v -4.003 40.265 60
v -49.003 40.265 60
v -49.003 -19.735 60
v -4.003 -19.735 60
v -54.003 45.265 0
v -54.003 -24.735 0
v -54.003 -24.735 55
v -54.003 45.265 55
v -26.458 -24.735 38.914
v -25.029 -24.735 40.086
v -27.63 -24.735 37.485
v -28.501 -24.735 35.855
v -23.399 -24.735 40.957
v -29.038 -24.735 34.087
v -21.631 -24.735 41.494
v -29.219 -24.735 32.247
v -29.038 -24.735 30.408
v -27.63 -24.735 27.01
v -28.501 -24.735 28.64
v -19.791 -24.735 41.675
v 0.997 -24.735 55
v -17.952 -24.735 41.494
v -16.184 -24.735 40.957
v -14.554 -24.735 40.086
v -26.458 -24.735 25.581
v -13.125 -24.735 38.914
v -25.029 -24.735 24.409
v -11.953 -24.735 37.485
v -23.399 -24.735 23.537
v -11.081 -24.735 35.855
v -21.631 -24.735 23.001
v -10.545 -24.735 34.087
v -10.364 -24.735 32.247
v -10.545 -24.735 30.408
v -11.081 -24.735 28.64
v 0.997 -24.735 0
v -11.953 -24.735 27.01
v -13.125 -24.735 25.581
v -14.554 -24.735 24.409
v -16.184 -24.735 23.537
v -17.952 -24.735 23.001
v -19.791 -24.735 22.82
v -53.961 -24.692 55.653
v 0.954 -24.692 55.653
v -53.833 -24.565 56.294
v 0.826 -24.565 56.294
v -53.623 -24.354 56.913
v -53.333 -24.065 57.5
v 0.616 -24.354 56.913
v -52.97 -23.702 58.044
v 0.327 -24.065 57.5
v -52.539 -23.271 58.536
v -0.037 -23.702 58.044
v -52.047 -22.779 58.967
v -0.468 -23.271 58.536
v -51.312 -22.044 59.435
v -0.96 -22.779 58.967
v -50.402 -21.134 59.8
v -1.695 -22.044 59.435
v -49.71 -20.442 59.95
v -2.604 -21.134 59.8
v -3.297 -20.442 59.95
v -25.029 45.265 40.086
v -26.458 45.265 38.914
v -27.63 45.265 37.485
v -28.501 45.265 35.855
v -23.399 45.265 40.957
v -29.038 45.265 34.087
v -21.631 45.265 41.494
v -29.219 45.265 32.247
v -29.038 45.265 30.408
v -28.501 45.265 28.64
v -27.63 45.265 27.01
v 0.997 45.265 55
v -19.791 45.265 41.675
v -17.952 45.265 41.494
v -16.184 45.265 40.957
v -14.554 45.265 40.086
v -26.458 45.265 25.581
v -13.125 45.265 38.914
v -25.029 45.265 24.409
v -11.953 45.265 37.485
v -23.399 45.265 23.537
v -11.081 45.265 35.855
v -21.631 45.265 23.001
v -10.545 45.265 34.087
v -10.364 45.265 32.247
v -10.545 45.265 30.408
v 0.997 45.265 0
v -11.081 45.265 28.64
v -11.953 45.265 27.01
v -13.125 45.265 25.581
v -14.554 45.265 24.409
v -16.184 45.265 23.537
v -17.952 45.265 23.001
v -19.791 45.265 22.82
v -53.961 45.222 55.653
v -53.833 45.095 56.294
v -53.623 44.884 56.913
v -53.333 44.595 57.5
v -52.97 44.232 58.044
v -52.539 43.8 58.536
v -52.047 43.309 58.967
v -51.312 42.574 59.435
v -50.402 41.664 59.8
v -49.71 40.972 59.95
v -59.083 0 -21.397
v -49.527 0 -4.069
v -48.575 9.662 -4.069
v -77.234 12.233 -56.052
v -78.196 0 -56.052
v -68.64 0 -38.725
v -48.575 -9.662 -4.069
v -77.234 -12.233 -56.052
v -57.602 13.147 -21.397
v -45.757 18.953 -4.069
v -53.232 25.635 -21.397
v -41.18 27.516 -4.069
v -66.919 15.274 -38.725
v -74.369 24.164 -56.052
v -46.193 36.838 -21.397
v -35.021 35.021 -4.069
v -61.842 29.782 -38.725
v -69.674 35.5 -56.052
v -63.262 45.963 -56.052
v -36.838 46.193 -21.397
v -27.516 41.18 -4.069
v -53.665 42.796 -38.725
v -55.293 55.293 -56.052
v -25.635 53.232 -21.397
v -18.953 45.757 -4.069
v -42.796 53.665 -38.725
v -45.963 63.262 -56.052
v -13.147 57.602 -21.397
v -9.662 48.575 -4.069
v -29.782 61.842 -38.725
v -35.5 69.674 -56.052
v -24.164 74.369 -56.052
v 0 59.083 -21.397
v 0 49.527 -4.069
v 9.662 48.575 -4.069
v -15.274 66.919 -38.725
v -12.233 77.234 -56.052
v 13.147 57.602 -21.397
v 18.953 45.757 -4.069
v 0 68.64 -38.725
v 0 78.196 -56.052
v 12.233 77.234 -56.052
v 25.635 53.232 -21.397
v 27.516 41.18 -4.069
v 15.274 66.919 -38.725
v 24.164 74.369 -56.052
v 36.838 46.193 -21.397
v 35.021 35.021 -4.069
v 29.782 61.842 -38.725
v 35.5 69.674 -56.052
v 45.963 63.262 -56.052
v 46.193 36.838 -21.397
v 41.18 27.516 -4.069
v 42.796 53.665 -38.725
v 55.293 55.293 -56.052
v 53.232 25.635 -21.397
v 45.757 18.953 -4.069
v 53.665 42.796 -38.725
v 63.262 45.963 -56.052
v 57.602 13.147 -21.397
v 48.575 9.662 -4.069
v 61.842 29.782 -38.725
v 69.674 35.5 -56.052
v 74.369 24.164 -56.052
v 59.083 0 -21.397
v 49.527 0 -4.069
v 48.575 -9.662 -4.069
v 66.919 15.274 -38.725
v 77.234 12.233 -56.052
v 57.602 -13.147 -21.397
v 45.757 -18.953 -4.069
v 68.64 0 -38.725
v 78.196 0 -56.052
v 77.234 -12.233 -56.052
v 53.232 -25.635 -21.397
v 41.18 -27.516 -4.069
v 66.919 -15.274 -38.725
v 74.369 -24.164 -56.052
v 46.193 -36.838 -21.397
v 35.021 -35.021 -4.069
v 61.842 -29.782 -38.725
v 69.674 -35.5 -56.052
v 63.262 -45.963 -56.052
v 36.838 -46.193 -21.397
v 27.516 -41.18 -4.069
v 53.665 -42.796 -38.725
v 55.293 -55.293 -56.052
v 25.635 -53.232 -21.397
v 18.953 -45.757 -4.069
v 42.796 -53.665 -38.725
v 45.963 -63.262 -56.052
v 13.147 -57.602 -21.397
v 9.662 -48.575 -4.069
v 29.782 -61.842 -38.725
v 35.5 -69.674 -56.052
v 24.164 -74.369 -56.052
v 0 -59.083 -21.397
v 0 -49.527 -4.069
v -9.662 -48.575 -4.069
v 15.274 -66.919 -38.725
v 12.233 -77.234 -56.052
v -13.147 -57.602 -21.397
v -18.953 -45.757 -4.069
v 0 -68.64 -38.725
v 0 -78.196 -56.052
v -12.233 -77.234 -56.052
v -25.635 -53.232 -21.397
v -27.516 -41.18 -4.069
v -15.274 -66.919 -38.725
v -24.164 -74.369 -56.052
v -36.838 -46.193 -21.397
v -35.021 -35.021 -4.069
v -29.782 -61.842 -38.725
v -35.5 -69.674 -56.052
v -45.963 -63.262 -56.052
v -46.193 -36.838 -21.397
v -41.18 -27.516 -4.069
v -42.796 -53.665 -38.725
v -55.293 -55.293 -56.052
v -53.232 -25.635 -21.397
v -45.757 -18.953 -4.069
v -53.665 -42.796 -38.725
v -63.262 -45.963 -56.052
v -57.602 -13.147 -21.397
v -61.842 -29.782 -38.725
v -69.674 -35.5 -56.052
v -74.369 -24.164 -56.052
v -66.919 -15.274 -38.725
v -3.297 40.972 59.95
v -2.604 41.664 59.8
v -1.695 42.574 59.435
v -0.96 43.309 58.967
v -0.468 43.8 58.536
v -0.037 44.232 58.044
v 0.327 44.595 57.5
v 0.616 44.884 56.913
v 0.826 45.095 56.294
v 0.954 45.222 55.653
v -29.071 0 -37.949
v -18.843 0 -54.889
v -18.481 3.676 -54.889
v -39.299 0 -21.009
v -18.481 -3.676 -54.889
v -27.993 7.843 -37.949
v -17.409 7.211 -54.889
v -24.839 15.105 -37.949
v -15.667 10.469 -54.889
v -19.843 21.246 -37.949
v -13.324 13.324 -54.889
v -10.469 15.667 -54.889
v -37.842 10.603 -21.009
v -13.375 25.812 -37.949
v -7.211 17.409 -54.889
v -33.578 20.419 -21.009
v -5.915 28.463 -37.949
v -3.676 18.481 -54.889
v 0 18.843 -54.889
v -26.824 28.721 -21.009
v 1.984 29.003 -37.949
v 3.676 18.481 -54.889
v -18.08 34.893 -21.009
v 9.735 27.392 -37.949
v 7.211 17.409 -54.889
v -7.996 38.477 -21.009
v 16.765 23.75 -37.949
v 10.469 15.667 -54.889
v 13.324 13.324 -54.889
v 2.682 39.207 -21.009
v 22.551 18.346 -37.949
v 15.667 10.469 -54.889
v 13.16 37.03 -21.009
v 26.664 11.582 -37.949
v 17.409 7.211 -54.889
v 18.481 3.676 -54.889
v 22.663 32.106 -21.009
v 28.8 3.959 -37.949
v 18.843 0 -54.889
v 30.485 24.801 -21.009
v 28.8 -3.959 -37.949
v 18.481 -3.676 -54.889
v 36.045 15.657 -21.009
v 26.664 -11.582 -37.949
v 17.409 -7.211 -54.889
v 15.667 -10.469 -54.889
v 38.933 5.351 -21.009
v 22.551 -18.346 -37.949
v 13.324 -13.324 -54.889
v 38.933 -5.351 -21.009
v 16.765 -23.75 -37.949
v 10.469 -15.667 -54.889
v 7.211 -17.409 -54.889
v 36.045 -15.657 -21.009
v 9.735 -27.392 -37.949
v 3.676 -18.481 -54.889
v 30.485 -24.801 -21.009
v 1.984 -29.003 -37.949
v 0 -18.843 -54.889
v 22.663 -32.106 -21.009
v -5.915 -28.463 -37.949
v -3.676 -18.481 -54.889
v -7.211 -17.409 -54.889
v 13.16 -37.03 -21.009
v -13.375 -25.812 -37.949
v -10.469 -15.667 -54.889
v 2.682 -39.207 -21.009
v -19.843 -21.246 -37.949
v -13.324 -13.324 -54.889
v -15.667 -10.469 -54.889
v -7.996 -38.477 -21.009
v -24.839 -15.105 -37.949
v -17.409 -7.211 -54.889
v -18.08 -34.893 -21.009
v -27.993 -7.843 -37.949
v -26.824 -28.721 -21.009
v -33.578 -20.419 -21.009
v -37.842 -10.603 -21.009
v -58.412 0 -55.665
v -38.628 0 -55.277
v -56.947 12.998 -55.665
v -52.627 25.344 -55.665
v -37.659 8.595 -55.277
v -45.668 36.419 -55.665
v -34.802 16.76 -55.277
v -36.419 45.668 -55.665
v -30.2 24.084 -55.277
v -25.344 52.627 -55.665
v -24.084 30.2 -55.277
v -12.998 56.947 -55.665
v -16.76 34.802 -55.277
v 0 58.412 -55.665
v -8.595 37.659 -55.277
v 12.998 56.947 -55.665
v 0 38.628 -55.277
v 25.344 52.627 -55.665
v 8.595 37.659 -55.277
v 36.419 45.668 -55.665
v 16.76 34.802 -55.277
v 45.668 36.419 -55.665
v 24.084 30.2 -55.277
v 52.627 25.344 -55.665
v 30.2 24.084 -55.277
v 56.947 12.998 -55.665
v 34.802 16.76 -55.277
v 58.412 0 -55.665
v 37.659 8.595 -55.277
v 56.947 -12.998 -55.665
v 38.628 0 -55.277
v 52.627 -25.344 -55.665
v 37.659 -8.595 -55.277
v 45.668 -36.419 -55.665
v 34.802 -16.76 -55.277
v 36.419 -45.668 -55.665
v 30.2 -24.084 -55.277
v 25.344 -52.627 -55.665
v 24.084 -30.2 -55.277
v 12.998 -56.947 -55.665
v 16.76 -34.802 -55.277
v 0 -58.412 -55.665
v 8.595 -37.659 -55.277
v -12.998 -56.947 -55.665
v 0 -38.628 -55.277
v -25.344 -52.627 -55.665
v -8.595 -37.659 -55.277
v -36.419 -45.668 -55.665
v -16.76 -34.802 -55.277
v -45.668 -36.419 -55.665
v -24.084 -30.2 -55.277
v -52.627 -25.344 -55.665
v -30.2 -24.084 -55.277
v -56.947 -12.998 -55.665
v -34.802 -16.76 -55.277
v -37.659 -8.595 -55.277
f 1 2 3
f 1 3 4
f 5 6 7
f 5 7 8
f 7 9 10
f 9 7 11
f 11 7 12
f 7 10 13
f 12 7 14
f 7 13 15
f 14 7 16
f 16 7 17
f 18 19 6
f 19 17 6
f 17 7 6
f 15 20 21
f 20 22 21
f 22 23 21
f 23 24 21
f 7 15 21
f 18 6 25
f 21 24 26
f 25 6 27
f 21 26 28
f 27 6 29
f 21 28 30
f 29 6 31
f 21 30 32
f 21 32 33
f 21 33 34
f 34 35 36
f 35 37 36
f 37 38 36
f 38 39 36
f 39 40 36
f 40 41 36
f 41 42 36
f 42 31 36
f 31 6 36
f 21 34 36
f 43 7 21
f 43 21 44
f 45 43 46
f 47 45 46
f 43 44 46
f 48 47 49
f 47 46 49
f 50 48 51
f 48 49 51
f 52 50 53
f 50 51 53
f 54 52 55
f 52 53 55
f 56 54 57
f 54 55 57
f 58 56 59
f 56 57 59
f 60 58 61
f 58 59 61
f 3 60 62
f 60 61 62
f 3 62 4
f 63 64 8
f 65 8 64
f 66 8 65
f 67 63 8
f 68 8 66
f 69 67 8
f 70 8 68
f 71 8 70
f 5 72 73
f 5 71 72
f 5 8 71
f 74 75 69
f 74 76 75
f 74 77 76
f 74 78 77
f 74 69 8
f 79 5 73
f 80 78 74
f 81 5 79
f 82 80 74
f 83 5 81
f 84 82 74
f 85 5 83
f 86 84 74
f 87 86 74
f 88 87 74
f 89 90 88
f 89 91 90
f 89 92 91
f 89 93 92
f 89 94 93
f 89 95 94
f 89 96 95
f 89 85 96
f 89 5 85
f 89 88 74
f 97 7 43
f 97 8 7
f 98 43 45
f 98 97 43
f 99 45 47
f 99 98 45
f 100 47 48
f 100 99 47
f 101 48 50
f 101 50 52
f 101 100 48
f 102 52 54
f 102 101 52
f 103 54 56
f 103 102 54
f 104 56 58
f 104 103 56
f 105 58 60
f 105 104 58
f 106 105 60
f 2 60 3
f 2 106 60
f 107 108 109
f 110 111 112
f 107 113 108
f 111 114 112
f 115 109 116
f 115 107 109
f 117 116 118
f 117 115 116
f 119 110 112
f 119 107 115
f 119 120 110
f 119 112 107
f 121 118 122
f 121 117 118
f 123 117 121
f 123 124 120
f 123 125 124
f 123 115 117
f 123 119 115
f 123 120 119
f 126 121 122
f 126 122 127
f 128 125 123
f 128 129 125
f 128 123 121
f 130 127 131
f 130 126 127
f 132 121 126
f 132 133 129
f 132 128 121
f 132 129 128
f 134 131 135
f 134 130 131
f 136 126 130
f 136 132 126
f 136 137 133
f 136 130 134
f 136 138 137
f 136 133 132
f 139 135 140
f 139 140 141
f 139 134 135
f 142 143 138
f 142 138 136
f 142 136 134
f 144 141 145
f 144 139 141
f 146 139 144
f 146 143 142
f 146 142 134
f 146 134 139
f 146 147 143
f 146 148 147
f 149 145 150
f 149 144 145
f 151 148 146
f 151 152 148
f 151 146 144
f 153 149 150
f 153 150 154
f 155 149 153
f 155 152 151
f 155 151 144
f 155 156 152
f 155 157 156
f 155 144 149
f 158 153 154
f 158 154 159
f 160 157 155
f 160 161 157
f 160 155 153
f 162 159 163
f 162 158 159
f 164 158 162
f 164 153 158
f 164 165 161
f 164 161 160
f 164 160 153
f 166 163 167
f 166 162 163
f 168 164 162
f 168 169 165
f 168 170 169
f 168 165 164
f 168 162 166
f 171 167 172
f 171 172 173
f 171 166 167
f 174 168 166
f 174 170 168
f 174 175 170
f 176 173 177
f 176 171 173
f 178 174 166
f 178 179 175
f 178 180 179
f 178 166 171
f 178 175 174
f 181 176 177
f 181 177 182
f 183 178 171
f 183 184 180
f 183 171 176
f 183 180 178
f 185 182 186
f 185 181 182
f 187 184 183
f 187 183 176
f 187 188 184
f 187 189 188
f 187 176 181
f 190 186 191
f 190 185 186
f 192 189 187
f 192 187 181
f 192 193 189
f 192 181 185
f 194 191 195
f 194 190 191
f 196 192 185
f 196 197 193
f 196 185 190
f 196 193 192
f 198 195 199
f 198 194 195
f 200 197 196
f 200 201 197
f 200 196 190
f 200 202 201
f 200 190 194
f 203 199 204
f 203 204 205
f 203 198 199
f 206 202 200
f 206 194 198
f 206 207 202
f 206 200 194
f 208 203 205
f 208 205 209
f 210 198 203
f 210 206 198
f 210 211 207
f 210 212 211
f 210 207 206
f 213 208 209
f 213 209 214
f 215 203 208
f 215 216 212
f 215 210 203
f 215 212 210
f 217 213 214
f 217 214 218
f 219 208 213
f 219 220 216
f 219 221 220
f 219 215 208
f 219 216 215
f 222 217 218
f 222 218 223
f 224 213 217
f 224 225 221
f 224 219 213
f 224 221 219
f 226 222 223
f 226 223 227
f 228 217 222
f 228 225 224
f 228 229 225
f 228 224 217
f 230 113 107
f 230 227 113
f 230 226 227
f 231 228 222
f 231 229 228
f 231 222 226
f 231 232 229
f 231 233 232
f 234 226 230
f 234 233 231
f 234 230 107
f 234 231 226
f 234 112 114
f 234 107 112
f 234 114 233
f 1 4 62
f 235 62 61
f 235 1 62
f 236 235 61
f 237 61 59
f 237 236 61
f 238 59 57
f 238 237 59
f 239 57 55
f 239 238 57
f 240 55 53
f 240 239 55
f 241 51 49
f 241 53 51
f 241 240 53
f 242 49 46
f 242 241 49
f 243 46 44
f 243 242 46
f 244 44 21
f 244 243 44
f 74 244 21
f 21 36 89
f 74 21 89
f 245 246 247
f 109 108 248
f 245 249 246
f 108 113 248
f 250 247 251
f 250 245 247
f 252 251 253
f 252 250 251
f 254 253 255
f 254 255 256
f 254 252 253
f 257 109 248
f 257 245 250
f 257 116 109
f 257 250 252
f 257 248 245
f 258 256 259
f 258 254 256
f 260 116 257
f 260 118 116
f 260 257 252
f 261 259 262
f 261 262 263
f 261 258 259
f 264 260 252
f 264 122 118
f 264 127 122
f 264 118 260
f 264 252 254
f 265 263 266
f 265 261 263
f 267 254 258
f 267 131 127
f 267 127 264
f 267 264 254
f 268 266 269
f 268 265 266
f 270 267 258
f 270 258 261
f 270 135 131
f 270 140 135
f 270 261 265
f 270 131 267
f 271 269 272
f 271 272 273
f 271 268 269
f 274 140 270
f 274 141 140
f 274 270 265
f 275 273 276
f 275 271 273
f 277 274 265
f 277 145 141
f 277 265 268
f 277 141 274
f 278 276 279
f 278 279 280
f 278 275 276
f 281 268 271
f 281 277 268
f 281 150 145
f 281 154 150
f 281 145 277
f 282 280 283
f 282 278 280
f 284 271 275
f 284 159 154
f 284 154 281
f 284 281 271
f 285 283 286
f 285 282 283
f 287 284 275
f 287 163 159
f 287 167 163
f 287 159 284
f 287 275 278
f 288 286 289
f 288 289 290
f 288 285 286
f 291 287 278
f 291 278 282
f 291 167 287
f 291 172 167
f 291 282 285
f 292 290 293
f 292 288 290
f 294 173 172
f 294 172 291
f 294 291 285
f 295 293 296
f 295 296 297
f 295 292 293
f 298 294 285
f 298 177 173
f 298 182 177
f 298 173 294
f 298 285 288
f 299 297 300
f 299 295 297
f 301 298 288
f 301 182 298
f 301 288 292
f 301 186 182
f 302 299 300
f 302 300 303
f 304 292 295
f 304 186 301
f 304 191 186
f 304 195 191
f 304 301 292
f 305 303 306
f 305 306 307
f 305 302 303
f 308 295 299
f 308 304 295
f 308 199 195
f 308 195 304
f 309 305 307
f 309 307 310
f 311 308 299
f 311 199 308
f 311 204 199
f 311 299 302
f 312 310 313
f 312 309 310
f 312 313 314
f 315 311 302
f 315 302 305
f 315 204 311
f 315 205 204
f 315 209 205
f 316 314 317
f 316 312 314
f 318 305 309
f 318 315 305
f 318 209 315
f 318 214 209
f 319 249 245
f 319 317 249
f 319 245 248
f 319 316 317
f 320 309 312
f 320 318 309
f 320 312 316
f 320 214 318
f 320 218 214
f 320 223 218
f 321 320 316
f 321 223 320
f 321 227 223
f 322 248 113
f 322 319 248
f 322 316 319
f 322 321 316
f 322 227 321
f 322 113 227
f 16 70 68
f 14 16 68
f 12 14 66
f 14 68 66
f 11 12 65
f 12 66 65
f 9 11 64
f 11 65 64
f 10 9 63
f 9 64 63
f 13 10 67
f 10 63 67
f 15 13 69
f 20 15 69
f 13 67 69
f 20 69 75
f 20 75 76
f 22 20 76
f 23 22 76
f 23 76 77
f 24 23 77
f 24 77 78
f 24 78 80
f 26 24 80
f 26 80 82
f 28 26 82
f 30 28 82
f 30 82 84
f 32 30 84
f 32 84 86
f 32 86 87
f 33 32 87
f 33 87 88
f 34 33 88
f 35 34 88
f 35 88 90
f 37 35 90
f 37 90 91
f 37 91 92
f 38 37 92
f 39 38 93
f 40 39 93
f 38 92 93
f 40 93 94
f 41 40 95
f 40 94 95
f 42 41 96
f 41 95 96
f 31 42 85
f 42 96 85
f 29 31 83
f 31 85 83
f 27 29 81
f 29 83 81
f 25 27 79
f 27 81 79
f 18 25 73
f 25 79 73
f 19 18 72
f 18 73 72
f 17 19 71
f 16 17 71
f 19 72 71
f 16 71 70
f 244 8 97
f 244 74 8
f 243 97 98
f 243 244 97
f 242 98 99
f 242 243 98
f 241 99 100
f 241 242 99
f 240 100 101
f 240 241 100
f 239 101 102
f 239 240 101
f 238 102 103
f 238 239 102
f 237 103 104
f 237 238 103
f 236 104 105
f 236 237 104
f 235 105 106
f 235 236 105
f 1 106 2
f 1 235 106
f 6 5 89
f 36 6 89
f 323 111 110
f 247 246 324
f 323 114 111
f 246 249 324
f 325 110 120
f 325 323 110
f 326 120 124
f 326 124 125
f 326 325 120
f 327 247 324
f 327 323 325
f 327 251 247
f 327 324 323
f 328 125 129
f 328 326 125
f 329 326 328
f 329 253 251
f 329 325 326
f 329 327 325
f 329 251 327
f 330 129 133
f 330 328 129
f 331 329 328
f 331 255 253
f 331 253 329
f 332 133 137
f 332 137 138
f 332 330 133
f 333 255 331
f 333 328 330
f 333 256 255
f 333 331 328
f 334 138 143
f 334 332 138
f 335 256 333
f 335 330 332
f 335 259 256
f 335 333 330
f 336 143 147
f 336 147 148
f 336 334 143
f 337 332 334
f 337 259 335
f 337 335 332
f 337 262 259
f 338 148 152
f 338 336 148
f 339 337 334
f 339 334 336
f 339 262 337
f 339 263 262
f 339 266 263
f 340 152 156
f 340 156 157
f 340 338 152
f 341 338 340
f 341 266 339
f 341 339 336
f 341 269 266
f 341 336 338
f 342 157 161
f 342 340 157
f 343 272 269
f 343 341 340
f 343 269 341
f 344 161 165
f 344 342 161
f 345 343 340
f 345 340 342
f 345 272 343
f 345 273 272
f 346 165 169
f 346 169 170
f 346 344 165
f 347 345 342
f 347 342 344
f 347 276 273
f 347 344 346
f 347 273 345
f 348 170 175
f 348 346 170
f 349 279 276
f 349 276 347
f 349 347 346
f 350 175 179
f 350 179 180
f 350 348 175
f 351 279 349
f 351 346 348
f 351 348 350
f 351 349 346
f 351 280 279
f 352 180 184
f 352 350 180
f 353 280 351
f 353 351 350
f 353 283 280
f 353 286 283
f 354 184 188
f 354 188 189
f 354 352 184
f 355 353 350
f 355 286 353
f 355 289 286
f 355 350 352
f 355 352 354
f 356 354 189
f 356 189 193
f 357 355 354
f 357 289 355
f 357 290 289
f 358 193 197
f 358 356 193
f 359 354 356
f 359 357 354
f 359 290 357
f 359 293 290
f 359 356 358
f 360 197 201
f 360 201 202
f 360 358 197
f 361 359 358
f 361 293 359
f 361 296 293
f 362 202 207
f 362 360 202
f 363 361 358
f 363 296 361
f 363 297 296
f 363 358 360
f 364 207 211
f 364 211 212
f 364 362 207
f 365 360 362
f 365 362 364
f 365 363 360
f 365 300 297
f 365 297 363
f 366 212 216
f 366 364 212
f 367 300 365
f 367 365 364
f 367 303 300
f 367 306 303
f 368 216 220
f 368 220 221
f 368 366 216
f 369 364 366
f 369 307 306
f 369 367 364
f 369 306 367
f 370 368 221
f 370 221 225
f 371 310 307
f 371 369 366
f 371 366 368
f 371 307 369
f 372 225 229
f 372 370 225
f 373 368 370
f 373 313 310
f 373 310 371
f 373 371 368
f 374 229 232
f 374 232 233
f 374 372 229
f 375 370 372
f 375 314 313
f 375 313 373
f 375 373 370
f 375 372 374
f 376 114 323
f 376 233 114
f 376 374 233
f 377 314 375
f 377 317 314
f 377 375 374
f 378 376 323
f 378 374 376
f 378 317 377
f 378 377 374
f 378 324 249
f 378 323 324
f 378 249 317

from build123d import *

# Parameters (mm, degrees)
F0_W     = 55
F0_H     = 70
F1_DEPTH = 60
F2_R     = 9.42751
F3_DEPTH = 90
F4_R     = 5


with BuildPart() as f1:
    # F0 (on Top) → F1 (new body)
    with BuildSketch(Plane.XY):
        with Locations((-26.50332, 10.264905)):
            Rectangle(F0_W, F0_H)
    extrude(amount=F1_DEPTH)

    # F2 (on face) → F3 (cut)
    with BuildSketch(Plane(origin=(0, 45.264905, 0), x_dir=(-1, 0, 0), z_dir=(0, 1, 0))):
        with Locations((19.791303, 32.247365)):
            Circle(F2_R)
    extrude(amount=-F3_DEPTH, mode=Mode.SUBTRACT)

    # F4
    f4_edges = [f1.edges().sort_by_distance(p)[0] for p in [
        (-26.50332, 45.264905, 60),
        (-54.00332, 10.264905, 60),
        (-26.50332, -24.735095, 60),
        (0.99668, 10.264905, 60),
    ]]
    fillet(f4_edges, radius=F4_R)


with BuildPart() as f6:
    # F5 (on Front) → F6 (revolve)
    with BuildSketch(Plane.XZ):
        Polygon((-18.843082, -54.889361), (-49.526865, -4.069341), (-78.196403, -56.052286), align=None)
    revolve(axis=Axis((0, 0, -36.606986), (0, 0, -1)))


solid = Compound([f1.part, f6.part])
